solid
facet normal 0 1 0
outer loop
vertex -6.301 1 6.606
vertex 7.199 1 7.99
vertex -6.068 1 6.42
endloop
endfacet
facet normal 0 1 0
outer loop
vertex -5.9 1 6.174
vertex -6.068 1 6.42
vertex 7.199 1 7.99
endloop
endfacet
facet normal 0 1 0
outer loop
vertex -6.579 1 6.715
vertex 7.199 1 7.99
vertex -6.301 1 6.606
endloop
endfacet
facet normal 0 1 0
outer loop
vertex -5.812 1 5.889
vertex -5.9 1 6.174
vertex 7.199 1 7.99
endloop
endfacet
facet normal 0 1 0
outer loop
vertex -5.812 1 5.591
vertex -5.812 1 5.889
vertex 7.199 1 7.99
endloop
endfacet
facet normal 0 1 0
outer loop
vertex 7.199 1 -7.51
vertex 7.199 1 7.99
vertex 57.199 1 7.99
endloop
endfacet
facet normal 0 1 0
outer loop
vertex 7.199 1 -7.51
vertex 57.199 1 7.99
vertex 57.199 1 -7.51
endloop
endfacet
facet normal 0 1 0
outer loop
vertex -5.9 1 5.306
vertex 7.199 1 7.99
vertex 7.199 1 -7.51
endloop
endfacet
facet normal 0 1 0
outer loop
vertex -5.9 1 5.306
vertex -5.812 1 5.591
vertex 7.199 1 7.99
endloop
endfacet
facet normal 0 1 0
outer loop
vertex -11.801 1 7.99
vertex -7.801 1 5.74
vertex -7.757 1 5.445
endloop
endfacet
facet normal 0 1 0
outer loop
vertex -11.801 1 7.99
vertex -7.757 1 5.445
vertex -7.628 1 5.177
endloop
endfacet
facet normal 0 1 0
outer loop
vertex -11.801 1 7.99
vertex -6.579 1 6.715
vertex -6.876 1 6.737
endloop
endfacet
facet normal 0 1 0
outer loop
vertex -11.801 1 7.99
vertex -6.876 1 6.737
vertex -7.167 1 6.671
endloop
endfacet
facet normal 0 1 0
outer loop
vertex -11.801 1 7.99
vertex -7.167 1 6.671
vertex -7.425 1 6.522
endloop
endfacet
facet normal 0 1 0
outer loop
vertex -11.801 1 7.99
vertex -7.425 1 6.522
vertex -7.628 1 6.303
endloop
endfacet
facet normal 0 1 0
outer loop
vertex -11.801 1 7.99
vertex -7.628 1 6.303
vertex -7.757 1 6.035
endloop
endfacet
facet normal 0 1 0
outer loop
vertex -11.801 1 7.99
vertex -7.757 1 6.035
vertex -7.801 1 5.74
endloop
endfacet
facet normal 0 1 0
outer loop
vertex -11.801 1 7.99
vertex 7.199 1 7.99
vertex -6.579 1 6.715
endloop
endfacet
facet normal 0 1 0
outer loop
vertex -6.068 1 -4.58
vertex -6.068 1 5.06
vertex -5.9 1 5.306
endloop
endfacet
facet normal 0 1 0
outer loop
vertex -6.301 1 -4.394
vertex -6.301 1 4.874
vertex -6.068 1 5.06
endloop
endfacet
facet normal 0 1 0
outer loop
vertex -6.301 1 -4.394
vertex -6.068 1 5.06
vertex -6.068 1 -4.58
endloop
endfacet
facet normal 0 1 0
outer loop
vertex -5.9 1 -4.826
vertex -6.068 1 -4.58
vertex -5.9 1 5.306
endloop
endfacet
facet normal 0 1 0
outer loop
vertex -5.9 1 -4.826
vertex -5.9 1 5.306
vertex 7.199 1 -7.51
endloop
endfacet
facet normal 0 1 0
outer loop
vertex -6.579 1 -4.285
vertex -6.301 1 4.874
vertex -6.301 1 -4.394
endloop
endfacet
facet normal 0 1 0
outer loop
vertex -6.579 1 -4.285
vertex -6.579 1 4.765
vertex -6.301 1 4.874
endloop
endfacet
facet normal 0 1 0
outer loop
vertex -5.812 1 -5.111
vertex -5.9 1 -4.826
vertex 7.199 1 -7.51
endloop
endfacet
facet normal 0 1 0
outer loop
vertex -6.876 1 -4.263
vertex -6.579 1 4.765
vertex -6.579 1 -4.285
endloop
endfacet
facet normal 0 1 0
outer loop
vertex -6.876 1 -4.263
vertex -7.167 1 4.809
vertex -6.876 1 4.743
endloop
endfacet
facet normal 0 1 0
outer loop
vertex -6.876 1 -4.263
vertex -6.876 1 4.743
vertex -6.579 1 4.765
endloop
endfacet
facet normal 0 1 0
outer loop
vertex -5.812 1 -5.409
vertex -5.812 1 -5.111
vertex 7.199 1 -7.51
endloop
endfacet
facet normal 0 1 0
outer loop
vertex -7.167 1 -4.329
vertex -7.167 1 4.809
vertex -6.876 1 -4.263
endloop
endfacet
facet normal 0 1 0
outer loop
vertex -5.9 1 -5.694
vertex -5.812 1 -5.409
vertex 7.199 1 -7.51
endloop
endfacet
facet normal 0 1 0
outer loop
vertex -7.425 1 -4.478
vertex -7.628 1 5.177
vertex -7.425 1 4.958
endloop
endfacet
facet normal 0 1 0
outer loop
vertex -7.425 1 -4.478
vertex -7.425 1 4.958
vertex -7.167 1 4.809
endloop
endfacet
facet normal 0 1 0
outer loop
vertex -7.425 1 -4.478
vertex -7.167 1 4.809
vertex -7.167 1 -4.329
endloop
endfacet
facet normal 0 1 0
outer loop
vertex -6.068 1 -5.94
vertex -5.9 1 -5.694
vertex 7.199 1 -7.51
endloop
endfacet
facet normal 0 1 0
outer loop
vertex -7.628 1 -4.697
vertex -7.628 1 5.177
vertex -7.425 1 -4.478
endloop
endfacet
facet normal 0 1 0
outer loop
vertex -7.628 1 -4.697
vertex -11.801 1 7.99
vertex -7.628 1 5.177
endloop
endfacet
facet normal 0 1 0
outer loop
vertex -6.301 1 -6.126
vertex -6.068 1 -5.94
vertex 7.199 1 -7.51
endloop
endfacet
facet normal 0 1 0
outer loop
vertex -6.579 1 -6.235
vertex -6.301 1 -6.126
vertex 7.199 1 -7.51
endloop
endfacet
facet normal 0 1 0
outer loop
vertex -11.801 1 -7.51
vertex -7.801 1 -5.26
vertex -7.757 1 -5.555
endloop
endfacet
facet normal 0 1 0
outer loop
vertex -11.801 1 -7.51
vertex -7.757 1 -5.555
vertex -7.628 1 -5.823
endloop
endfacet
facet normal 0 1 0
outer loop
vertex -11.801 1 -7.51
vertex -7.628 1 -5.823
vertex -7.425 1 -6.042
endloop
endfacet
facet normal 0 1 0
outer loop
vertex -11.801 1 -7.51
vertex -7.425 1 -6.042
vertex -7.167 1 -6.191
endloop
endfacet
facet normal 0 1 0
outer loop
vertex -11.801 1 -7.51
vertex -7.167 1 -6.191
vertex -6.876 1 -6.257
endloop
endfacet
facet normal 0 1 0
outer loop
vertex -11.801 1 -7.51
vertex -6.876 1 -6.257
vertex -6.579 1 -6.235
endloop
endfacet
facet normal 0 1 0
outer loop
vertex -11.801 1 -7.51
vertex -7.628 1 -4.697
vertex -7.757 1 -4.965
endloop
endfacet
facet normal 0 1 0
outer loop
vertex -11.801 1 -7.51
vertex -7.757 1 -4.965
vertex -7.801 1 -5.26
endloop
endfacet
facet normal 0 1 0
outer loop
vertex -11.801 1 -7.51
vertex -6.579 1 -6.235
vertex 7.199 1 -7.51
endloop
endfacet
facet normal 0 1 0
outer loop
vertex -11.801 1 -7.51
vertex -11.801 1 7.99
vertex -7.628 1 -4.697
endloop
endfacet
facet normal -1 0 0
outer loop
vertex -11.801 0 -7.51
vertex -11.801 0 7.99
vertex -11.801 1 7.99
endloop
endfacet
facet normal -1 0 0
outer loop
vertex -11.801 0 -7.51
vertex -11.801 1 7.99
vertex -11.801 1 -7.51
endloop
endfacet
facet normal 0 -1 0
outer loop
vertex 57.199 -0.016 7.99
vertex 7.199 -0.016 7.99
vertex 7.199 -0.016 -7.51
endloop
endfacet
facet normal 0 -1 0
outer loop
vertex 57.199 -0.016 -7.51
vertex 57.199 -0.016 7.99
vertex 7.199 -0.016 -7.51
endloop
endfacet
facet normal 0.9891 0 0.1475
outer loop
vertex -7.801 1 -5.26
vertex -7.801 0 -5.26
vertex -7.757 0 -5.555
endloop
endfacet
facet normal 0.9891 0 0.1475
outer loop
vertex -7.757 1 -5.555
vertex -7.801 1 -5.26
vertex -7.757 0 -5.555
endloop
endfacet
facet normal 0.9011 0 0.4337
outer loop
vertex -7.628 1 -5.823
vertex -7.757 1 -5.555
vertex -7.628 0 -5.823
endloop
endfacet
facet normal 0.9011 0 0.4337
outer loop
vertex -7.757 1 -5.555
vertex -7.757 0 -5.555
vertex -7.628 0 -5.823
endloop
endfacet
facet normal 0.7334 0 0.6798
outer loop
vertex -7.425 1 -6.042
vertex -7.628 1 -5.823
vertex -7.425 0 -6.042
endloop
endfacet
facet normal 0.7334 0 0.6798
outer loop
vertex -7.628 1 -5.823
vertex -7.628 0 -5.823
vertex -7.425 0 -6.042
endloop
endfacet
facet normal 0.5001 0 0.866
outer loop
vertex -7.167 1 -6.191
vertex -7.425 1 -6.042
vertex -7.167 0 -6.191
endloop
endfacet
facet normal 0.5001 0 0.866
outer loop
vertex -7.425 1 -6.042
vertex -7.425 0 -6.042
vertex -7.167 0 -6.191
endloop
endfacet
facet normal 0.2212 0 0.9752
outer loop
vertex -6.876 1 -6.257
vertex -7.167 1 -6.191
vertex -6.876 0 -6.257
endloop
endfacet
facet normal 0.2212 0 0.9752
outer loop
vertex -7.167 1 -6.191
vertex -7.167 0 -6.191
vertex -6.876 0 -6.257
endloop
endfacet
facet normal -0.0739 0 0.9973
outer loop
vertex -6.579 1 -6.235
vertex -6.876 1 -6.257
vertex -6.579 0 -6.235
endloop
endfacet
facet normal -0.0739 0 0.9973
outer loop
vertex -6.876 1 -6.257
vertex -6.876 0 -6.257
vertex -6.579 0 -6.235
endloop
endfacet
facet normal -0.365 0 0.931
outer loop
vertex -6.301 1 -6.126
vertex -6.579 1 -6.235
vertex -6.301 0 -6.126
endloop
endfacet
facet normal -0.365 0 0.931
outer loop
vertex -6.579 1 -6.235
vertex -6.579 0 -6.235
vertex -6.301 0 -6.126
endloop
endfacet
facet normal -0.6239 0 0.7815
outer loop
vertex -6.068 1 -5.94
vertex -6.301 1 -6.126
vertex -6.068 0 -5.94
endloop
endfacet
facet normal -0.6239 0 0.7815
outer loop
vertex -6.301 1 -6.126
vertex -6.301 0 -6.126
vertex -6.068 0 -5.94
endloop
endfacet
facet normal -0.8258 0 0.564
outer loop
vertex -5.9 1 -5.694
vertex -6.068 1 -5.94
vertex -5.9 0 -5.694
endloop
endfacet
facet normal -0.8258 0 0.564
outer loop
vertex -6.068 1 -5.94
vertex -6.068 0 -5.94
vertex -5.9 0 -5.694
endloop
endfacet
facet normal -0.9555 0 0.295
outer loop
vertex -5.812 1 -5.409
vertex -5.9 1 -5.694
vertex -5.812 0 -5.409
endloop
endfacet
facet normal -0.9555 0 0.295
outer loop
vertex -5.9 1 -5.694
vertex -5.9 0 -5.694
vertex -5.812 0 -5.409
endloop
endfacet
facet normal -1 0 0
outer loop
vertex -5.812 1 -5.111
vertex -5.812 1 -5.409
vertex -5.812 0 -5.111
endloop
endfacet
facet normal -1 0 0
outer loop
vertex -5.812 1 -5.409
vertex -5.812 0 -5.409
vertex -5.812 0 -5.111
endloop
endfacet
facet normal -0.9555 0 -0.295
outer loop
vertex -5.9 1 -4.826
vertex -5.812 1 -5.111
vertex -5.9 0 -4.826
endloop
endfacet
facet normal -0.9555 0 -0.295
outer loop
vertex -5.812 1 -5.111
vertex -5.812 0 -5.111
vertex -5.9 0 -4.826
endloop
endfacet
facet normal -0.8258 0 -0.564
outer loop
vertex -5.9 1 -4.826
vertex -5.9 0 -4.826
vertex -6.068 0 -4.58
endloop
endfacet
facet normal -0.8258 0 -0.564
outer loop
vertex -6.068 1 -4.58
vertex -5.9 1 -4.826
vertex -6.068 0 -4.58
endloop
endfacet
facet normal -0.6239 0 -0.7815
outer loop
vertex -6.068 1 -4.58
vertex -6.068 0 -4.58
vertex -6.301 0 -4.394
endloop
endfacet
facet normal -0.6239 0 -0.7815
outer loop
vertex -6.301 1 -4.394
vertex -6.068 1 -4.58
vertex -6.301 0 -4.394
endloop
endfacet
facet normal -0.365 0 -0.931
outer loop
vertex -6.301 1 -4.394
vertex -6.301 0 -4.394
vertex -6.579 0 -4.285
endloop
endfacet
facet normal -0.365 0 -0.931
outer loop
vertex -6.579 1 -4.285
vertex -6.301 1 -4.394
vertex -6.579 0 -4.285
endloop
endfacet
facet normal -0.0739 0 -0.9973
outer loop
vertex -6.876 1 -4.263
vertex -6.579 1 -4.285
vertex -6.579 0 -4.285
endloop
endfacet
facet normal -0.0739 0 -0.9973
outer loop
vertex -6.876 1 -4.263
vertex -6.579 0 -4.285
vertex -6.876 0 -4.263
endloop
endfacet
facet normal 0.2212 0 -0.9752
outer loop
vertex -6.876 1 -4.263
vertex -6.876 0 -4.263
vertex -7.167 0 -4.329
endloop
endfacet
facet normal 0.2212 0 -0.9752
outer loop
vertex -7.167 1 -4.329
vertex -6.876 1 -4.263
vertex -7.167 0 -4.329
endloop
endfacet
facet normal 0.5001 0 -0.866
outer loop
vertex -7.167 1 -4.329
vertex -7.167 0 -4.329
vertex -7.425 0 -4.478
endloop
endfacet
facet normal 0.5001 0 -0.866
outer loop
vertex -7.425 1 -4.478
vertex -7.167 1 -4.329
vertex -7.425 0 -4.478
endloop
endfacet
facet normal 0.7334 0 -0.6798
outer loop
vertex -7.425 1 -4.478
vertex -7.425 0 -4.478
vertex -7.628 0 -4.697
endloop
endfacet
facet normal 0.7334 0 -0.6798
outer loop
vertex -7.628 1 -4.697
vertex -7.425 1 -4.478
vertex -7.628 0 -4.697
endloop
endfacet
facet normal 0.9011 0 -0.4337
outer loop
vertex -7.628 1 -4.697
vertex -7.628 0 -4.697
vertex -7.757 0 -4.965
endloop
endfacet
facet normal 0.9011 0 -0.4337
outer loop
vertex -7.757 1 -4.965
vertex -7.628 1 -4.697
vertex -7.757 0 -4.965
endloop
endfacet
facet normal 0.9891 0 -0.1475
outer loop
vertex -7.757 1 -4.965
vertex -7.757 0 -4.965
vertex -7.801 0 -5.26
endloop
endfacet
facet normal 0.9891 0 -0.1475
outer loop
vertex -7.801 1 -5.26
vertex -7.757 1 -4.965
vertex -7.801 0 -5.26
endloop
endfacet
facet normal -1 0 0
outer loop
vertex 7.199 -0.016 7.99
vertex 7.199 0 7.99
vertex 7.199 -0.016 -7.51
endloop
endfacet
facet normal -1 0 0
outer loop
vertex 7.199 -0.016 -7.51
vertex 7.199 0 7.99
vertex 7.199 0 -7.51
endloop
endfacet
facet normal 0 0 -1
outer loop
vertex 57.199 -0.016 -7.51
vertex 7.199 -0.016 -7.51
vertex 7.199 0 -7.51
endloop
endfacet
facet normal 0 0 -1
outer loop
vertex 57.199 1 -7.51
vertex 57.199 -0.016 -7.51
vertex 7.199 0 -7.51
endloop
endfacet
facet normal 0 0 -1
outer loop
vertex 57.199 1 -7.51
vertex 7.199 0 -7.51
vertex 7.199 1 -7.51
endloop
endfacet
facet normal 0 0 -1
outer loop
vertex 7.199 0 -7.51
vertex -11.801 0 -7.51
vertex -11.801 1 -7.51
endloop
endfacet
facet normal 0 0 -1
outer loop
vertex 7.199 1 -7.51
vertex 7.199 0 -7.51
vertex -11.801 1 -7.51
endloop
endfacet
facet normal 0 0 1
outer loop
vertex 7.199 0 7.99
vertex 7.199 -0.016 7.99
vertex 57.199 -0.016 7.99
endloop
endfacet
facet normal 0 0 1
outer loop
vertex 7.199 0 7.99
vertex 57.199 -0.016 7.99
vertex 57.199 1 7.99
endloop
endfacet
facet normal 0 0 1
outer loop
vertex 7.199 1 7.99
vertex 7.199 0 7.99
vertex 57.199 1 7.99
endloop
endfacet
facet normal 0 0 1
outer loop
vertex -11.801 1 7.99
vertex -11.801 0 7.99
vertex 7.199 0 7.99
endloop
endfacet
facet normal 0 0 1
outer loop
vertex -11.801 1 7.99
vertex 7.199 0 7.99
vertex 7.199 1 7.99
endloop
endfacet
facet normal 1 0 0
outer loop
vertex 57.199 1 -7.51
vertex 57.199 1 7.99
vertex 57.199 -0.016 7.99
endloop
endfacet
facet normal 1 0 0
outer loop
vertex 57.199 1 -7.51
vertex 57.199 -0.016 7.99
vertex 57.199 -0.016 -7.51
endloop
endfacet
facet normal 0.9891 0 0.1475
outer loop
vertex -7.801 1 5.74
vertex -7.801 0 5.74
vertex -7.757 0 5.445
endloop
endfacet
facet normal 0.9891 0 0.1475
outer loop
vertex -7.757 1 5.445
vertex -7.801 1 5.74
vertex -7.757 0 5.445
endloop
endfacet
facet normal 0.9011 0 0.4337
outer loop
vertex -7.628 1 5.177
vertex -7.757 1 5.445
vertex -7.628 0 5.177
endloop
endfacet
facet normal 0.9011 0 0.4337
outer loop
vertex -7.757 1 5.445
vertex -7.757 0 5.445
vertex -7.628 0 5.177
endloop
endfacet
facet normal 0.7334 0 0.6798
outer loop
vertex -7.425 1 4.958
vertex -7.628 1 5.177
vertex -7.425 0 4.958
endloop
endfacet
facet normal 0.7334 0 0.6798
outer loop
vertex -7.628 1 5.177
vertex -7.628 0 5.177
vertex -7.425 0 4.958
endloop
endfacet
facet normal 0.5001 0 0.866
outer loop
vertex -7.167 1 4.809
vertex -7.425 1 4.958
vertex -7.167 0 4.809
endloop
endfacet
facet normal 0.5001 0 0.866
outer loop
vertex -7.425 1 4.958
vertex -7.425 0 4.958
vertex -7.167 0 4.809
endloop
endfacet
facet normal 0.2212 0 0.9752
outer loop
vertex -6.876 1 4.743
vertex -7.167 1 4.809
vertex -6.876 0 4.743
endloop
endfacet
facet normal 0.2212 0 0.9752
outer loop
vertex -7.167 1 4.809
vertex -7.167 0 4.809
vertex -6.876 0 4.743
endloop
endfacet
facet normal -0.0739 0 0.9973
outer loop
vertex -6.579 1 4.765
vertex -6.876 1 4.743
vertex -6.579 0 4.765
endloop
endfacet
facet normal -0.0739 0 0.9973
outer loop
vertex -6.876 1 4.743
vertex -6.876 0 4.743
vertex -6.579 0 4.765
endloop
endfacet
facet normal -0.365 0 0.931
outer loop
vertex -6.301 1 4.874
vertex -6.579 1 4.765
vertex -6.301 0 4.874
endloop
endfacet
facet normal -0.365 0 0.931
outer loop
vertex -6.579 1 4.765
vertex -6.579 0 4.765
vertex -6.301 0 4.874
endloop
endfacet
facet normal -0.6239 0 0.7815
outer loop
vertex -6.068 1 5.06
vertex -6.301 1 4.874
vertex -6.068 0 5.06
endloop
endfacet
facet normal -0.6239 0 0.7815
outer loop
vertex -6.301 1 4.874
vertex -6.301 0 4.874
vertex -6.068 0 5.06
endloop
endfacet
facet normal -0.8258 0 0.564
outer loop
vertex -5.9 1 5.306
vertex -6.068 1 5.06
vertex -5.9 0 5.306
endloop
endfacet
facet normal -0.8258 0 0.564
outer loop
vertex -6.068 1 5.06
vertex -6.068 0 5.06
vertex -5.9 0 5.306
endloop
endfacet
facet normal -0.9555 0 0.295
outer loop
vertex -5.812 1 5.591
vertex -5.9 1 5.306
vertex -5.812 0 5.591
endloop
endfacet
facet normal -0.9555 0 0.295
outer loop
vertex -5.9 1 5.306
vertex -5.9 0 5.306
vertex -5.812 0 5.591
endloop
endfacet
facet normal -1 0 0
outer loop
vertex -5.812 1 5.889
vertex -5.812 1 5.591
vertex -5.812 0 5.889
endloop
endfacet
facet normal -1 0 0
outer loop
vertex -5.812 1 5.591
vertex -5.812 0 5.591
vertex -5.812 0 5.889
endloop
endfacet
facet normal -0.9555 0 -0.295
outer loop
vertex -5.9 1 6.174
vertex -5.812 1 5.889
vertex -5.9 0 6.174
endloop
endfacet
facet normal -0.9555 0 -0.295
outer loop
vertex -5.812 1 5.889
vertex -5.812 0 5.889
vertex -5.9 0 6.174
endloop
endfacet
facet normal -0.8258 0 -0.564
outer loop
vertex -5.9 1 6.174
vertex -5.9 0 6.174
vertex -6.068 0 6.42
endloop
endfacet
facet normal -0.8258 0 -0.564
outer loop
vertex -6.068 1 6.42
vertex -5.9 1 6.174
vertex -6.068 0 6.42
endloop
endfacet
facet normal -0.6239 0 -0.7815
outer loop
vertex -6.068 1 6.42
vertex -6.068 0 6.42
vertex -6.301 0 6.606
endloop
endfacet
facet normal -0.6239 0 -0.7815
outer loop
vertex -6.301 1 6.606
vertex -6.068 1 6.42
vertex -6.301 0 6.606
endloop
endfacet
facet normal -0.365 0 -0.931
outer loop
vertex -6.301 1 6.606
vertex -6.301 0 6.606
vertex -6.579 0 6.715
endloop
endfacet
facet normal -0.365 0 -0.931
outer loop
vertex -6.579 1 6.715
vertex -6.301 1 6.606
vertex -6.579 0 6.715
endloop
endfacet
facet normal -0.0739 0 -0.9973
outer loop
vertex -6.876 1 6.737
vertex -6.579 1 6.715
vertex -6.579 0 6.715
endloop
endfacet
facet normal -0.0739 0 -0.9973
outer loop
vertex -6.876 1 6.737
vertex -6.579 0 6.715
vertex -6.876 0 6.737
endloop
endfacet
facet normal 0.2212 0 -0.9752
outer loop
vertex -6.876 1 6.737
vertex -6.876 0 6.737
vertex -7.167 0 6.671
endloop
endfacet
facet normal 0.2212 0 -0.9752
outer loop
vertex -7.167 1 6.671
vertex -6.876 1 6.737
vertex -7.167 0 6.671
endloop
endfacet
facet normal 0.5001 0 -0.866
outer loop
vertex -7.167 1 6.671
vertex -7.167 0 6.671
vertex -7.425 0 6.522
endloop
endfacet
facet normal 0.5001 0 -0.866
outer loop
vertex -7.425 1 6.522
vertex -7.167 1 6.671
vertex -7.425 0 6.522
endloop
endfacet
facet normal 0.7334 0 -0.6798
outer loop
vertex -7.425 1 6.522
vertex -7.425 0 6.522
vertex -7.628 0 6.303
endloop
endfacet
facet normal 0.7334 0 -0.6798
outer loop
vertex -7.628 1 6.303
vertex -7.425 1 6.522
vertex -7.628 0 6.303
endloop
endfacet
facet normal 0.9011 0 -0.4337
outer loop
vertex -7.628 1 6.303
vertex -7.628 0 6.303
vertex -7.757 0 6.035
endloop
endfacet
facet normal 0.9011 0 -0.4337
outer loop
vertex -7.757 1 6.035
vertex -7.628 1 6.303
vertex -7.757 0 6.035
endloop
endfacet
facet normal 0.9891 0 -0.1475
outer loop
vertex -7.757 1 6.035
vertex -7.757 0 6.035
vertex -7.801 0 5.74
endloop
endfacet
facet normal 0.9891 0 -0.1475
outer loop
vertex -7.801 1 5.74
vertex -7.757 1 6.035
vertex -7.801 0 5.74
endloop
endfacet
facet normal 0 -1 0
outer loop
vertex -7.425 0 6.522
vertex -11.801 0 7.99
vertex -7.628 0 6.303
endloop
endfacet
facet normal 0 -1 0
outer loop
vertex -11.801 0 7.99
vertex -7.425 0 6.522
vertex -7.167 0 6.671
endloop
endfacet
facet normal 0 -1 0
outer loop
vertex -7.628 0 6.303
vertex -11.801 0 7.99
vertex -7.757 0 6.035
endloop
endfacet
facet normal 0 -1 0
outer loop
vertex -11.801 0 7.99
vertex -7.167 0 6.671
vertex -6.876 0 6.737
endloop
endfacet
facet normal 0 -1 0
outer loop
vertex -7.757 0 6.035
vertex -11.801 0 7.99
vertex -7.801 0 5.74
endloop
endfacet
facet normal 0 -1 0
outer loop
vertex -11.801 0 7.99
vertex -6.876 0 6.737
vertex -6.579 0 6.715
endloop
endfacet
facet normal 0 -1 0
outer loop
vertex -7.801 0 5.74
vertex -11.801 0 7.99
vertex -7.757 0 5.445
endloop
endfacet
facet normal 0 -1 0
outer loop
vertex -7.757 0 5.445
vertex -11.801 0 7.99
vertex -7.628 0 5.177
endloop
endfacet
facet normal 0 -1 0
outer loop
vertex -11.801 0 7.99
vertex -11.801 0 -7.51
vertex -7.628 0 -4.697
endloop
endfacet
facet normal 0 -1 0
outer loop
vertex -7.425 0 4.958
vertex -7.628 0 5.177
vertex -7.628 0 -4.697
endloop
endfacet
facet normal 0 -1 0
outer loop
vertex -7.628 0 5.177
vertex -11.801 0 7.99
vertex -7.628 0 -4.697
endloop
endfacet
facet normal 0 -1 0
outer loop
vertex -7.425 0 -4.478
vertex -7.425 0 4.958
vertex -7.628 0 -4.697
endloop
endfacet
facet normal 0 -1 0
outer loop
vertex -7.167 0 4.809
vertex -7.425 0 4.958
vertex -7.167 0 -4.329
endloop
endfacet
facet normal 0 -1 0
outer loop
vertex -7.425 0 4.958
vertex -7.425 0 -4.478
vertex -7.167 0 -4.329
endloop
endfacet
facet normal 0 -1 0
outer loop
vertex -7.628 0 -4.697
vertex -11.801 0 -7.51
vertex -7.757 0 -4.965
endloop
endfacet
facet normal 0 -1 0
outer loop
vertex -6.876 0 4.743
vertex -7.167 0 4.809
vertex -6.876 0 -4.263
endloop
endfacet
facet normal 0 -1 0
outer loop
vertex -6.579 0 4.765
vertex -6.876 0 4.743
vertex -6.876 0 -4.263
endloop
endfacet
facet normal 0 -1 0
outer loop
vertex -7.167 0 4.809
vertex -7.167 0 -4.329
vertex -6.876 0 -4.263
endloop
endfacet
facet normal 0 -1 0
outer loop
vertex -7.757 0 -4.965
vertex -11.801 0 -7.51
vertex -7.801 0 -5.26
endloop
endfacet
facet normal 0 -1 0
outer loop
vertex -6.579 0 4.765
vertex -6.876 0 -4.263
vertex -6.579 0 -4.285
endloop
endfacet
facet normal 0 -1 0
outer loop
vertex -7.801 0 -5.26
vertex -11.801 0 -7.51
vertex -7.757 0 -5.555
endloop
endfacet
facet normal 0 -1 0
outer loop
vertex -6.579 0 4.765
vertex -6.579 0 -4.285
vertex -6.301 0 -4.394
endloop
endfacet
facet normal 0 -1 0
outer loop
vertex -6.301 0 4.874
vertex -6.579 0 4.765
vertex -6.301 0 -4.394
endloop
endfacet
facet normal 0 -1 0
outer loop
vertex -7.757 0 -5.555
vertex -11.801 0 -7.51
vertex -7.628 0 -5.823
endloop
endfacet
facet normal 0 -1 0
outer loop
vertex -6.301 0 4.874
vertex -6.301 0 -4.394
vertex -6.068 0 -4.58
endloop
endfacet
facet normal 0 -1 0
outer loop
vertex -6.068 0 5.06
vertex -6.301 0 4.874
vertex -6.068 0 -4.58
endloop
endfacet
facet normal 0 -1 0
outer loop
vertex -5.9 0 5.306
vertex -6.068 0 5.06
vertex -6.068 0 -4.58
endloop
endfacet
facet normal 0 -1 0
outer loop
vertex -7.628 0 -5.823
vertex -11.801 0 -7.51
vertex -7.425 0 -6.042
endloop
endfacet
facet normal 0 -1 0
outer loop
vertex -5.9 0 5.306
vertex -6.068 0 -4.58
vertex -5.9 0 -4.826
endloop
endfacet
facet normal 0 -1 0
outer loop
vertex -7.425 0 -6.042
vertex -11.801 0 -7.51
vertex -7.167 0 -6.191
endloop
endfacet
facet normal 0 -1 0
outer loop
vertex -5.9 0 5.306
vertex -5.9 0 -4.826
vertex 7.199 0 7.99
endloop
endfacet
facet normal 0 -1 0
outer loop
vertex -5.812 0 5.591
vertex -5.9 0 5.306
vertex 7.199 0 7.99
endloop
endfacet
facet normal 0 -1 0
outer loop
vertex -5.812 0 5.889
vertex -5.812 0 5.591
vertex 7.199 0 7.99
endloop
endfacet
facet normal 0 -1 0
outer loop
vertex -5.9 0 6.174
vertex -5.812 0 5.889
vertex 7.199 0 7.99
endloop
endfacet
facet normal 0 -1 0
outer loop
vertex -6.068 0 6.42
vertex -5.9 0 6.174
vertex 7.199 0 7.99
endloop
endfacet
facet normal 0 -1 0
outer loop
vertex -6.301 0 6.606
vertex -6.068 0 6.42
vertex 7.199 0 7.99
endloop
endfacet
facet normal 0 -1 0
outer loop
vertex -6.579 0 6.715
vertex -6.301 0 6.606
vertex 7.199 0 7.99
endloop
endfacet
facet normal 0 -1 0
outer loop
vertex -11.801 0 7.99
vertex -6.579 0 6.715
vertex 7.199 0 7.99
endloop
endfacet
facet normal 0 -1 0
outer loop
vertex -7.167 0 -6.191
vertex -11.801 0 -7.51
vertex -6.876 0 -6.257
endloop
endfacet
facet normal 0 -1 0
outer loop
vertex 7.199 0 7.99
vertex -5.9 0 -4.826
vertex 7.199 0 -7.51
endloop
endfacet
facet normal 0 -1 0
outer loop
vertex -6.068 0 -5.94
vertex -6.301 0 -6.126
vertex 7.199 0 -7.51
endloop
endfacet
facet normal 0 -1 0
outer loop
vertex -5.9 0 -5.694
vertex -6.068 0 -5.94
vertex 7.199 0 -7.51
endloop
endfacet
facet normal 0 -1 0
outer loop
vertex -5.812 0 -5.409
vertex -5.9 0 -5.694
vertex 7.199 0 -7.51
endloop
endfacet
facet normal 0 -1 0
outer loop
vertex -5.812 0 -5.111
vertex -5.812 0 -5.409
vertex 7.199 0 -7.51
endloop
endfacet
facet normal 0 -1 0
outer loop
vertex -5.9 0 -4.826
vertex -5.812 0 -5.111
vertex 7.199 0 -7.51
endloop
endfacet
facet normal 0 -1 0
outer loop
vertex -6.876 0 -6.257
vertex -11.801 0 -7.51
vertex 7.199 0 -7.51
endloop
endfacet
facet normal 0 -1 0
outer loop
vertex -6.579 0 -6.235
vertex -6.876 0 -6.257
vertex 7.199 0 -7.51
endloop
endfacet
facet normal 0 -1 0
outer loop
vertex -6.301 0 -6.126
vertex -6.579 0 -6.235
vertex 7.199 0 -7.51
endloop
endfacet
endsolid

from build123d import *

# Parameters (mm, degrees)
SKETCH1_W                 = 19
SKETCH1_H                 = 15.5
BOSS_EXTRUDE1_DEPTH       = 1
F_1_0MM_DOWEL_HOLE1_D     = 2
F_1_0MM_DOWEL_HOLE1_DEPTH = 25
F_1_0MM_DOWEL_HOLE1_TIP   = 0.600860619
SKETCH4_W                 = 15.5
SKETCH4_H                 = 1.015904831
BOSS_EXTRUDE2_DEPTH       = 50


with BuildPart() as part:
    # Sketch1 → Boss-Extrude1 (new body)
    with BuildSketch(Plane(origin=(0, 0, 0), x_dir=(1, 0, 0), z_dir=(0, 1, 0))):
        with Locations((-2.301324503, -0.240066225)):
            Rectangle(SKETCH1_W, SKETCH1_H)
    extrude(amount=BOSS_EXTRUDE1_DEPTH)

    # Ø1.0mm Dowel Hole1
    with Locations(Plane(origin=(0, 1, 0), x_dir=(1, 0, 0), z_dir=(0, 1, 0))):
        with Locations((-6.801324503, 5.259933775), (-6.801324503, -5.740066225)):
            Hole(F_1_0MM_DOWEL_HOLE1_D / 2, depth=F_1_0MM_DOWEL_HOLE1_DEPTH)
            with Locations((0, 0, -(F_1_0MM_DOWEL_HOLE1_DEPTH + F_1_0MM_DOWEL_HOLE1_TIP / 2))):  # 118° drill point
                Cone(0, F_1_0MM_DOWEL_HOLE1_D / 2, F_1_0MM_DOWEL_HOLE1_TIP, mode=Mode.SUBTRACT)

    # Sketch4 → Boss-Extrude2 (add)
    with BuildSketch(Plane(origin=(7.198675497, 0, 0), x_dir=(0, 0, -1), z_dir=(1, 0, 0))):
        with Locations((-0.240066225, 0.492047585)):
            Rectangle(SKETCH4_W, SKETCH4_H)
    extrude(amount=BOSS_EXTRUDE2_DEPTH)


solid = part.part
